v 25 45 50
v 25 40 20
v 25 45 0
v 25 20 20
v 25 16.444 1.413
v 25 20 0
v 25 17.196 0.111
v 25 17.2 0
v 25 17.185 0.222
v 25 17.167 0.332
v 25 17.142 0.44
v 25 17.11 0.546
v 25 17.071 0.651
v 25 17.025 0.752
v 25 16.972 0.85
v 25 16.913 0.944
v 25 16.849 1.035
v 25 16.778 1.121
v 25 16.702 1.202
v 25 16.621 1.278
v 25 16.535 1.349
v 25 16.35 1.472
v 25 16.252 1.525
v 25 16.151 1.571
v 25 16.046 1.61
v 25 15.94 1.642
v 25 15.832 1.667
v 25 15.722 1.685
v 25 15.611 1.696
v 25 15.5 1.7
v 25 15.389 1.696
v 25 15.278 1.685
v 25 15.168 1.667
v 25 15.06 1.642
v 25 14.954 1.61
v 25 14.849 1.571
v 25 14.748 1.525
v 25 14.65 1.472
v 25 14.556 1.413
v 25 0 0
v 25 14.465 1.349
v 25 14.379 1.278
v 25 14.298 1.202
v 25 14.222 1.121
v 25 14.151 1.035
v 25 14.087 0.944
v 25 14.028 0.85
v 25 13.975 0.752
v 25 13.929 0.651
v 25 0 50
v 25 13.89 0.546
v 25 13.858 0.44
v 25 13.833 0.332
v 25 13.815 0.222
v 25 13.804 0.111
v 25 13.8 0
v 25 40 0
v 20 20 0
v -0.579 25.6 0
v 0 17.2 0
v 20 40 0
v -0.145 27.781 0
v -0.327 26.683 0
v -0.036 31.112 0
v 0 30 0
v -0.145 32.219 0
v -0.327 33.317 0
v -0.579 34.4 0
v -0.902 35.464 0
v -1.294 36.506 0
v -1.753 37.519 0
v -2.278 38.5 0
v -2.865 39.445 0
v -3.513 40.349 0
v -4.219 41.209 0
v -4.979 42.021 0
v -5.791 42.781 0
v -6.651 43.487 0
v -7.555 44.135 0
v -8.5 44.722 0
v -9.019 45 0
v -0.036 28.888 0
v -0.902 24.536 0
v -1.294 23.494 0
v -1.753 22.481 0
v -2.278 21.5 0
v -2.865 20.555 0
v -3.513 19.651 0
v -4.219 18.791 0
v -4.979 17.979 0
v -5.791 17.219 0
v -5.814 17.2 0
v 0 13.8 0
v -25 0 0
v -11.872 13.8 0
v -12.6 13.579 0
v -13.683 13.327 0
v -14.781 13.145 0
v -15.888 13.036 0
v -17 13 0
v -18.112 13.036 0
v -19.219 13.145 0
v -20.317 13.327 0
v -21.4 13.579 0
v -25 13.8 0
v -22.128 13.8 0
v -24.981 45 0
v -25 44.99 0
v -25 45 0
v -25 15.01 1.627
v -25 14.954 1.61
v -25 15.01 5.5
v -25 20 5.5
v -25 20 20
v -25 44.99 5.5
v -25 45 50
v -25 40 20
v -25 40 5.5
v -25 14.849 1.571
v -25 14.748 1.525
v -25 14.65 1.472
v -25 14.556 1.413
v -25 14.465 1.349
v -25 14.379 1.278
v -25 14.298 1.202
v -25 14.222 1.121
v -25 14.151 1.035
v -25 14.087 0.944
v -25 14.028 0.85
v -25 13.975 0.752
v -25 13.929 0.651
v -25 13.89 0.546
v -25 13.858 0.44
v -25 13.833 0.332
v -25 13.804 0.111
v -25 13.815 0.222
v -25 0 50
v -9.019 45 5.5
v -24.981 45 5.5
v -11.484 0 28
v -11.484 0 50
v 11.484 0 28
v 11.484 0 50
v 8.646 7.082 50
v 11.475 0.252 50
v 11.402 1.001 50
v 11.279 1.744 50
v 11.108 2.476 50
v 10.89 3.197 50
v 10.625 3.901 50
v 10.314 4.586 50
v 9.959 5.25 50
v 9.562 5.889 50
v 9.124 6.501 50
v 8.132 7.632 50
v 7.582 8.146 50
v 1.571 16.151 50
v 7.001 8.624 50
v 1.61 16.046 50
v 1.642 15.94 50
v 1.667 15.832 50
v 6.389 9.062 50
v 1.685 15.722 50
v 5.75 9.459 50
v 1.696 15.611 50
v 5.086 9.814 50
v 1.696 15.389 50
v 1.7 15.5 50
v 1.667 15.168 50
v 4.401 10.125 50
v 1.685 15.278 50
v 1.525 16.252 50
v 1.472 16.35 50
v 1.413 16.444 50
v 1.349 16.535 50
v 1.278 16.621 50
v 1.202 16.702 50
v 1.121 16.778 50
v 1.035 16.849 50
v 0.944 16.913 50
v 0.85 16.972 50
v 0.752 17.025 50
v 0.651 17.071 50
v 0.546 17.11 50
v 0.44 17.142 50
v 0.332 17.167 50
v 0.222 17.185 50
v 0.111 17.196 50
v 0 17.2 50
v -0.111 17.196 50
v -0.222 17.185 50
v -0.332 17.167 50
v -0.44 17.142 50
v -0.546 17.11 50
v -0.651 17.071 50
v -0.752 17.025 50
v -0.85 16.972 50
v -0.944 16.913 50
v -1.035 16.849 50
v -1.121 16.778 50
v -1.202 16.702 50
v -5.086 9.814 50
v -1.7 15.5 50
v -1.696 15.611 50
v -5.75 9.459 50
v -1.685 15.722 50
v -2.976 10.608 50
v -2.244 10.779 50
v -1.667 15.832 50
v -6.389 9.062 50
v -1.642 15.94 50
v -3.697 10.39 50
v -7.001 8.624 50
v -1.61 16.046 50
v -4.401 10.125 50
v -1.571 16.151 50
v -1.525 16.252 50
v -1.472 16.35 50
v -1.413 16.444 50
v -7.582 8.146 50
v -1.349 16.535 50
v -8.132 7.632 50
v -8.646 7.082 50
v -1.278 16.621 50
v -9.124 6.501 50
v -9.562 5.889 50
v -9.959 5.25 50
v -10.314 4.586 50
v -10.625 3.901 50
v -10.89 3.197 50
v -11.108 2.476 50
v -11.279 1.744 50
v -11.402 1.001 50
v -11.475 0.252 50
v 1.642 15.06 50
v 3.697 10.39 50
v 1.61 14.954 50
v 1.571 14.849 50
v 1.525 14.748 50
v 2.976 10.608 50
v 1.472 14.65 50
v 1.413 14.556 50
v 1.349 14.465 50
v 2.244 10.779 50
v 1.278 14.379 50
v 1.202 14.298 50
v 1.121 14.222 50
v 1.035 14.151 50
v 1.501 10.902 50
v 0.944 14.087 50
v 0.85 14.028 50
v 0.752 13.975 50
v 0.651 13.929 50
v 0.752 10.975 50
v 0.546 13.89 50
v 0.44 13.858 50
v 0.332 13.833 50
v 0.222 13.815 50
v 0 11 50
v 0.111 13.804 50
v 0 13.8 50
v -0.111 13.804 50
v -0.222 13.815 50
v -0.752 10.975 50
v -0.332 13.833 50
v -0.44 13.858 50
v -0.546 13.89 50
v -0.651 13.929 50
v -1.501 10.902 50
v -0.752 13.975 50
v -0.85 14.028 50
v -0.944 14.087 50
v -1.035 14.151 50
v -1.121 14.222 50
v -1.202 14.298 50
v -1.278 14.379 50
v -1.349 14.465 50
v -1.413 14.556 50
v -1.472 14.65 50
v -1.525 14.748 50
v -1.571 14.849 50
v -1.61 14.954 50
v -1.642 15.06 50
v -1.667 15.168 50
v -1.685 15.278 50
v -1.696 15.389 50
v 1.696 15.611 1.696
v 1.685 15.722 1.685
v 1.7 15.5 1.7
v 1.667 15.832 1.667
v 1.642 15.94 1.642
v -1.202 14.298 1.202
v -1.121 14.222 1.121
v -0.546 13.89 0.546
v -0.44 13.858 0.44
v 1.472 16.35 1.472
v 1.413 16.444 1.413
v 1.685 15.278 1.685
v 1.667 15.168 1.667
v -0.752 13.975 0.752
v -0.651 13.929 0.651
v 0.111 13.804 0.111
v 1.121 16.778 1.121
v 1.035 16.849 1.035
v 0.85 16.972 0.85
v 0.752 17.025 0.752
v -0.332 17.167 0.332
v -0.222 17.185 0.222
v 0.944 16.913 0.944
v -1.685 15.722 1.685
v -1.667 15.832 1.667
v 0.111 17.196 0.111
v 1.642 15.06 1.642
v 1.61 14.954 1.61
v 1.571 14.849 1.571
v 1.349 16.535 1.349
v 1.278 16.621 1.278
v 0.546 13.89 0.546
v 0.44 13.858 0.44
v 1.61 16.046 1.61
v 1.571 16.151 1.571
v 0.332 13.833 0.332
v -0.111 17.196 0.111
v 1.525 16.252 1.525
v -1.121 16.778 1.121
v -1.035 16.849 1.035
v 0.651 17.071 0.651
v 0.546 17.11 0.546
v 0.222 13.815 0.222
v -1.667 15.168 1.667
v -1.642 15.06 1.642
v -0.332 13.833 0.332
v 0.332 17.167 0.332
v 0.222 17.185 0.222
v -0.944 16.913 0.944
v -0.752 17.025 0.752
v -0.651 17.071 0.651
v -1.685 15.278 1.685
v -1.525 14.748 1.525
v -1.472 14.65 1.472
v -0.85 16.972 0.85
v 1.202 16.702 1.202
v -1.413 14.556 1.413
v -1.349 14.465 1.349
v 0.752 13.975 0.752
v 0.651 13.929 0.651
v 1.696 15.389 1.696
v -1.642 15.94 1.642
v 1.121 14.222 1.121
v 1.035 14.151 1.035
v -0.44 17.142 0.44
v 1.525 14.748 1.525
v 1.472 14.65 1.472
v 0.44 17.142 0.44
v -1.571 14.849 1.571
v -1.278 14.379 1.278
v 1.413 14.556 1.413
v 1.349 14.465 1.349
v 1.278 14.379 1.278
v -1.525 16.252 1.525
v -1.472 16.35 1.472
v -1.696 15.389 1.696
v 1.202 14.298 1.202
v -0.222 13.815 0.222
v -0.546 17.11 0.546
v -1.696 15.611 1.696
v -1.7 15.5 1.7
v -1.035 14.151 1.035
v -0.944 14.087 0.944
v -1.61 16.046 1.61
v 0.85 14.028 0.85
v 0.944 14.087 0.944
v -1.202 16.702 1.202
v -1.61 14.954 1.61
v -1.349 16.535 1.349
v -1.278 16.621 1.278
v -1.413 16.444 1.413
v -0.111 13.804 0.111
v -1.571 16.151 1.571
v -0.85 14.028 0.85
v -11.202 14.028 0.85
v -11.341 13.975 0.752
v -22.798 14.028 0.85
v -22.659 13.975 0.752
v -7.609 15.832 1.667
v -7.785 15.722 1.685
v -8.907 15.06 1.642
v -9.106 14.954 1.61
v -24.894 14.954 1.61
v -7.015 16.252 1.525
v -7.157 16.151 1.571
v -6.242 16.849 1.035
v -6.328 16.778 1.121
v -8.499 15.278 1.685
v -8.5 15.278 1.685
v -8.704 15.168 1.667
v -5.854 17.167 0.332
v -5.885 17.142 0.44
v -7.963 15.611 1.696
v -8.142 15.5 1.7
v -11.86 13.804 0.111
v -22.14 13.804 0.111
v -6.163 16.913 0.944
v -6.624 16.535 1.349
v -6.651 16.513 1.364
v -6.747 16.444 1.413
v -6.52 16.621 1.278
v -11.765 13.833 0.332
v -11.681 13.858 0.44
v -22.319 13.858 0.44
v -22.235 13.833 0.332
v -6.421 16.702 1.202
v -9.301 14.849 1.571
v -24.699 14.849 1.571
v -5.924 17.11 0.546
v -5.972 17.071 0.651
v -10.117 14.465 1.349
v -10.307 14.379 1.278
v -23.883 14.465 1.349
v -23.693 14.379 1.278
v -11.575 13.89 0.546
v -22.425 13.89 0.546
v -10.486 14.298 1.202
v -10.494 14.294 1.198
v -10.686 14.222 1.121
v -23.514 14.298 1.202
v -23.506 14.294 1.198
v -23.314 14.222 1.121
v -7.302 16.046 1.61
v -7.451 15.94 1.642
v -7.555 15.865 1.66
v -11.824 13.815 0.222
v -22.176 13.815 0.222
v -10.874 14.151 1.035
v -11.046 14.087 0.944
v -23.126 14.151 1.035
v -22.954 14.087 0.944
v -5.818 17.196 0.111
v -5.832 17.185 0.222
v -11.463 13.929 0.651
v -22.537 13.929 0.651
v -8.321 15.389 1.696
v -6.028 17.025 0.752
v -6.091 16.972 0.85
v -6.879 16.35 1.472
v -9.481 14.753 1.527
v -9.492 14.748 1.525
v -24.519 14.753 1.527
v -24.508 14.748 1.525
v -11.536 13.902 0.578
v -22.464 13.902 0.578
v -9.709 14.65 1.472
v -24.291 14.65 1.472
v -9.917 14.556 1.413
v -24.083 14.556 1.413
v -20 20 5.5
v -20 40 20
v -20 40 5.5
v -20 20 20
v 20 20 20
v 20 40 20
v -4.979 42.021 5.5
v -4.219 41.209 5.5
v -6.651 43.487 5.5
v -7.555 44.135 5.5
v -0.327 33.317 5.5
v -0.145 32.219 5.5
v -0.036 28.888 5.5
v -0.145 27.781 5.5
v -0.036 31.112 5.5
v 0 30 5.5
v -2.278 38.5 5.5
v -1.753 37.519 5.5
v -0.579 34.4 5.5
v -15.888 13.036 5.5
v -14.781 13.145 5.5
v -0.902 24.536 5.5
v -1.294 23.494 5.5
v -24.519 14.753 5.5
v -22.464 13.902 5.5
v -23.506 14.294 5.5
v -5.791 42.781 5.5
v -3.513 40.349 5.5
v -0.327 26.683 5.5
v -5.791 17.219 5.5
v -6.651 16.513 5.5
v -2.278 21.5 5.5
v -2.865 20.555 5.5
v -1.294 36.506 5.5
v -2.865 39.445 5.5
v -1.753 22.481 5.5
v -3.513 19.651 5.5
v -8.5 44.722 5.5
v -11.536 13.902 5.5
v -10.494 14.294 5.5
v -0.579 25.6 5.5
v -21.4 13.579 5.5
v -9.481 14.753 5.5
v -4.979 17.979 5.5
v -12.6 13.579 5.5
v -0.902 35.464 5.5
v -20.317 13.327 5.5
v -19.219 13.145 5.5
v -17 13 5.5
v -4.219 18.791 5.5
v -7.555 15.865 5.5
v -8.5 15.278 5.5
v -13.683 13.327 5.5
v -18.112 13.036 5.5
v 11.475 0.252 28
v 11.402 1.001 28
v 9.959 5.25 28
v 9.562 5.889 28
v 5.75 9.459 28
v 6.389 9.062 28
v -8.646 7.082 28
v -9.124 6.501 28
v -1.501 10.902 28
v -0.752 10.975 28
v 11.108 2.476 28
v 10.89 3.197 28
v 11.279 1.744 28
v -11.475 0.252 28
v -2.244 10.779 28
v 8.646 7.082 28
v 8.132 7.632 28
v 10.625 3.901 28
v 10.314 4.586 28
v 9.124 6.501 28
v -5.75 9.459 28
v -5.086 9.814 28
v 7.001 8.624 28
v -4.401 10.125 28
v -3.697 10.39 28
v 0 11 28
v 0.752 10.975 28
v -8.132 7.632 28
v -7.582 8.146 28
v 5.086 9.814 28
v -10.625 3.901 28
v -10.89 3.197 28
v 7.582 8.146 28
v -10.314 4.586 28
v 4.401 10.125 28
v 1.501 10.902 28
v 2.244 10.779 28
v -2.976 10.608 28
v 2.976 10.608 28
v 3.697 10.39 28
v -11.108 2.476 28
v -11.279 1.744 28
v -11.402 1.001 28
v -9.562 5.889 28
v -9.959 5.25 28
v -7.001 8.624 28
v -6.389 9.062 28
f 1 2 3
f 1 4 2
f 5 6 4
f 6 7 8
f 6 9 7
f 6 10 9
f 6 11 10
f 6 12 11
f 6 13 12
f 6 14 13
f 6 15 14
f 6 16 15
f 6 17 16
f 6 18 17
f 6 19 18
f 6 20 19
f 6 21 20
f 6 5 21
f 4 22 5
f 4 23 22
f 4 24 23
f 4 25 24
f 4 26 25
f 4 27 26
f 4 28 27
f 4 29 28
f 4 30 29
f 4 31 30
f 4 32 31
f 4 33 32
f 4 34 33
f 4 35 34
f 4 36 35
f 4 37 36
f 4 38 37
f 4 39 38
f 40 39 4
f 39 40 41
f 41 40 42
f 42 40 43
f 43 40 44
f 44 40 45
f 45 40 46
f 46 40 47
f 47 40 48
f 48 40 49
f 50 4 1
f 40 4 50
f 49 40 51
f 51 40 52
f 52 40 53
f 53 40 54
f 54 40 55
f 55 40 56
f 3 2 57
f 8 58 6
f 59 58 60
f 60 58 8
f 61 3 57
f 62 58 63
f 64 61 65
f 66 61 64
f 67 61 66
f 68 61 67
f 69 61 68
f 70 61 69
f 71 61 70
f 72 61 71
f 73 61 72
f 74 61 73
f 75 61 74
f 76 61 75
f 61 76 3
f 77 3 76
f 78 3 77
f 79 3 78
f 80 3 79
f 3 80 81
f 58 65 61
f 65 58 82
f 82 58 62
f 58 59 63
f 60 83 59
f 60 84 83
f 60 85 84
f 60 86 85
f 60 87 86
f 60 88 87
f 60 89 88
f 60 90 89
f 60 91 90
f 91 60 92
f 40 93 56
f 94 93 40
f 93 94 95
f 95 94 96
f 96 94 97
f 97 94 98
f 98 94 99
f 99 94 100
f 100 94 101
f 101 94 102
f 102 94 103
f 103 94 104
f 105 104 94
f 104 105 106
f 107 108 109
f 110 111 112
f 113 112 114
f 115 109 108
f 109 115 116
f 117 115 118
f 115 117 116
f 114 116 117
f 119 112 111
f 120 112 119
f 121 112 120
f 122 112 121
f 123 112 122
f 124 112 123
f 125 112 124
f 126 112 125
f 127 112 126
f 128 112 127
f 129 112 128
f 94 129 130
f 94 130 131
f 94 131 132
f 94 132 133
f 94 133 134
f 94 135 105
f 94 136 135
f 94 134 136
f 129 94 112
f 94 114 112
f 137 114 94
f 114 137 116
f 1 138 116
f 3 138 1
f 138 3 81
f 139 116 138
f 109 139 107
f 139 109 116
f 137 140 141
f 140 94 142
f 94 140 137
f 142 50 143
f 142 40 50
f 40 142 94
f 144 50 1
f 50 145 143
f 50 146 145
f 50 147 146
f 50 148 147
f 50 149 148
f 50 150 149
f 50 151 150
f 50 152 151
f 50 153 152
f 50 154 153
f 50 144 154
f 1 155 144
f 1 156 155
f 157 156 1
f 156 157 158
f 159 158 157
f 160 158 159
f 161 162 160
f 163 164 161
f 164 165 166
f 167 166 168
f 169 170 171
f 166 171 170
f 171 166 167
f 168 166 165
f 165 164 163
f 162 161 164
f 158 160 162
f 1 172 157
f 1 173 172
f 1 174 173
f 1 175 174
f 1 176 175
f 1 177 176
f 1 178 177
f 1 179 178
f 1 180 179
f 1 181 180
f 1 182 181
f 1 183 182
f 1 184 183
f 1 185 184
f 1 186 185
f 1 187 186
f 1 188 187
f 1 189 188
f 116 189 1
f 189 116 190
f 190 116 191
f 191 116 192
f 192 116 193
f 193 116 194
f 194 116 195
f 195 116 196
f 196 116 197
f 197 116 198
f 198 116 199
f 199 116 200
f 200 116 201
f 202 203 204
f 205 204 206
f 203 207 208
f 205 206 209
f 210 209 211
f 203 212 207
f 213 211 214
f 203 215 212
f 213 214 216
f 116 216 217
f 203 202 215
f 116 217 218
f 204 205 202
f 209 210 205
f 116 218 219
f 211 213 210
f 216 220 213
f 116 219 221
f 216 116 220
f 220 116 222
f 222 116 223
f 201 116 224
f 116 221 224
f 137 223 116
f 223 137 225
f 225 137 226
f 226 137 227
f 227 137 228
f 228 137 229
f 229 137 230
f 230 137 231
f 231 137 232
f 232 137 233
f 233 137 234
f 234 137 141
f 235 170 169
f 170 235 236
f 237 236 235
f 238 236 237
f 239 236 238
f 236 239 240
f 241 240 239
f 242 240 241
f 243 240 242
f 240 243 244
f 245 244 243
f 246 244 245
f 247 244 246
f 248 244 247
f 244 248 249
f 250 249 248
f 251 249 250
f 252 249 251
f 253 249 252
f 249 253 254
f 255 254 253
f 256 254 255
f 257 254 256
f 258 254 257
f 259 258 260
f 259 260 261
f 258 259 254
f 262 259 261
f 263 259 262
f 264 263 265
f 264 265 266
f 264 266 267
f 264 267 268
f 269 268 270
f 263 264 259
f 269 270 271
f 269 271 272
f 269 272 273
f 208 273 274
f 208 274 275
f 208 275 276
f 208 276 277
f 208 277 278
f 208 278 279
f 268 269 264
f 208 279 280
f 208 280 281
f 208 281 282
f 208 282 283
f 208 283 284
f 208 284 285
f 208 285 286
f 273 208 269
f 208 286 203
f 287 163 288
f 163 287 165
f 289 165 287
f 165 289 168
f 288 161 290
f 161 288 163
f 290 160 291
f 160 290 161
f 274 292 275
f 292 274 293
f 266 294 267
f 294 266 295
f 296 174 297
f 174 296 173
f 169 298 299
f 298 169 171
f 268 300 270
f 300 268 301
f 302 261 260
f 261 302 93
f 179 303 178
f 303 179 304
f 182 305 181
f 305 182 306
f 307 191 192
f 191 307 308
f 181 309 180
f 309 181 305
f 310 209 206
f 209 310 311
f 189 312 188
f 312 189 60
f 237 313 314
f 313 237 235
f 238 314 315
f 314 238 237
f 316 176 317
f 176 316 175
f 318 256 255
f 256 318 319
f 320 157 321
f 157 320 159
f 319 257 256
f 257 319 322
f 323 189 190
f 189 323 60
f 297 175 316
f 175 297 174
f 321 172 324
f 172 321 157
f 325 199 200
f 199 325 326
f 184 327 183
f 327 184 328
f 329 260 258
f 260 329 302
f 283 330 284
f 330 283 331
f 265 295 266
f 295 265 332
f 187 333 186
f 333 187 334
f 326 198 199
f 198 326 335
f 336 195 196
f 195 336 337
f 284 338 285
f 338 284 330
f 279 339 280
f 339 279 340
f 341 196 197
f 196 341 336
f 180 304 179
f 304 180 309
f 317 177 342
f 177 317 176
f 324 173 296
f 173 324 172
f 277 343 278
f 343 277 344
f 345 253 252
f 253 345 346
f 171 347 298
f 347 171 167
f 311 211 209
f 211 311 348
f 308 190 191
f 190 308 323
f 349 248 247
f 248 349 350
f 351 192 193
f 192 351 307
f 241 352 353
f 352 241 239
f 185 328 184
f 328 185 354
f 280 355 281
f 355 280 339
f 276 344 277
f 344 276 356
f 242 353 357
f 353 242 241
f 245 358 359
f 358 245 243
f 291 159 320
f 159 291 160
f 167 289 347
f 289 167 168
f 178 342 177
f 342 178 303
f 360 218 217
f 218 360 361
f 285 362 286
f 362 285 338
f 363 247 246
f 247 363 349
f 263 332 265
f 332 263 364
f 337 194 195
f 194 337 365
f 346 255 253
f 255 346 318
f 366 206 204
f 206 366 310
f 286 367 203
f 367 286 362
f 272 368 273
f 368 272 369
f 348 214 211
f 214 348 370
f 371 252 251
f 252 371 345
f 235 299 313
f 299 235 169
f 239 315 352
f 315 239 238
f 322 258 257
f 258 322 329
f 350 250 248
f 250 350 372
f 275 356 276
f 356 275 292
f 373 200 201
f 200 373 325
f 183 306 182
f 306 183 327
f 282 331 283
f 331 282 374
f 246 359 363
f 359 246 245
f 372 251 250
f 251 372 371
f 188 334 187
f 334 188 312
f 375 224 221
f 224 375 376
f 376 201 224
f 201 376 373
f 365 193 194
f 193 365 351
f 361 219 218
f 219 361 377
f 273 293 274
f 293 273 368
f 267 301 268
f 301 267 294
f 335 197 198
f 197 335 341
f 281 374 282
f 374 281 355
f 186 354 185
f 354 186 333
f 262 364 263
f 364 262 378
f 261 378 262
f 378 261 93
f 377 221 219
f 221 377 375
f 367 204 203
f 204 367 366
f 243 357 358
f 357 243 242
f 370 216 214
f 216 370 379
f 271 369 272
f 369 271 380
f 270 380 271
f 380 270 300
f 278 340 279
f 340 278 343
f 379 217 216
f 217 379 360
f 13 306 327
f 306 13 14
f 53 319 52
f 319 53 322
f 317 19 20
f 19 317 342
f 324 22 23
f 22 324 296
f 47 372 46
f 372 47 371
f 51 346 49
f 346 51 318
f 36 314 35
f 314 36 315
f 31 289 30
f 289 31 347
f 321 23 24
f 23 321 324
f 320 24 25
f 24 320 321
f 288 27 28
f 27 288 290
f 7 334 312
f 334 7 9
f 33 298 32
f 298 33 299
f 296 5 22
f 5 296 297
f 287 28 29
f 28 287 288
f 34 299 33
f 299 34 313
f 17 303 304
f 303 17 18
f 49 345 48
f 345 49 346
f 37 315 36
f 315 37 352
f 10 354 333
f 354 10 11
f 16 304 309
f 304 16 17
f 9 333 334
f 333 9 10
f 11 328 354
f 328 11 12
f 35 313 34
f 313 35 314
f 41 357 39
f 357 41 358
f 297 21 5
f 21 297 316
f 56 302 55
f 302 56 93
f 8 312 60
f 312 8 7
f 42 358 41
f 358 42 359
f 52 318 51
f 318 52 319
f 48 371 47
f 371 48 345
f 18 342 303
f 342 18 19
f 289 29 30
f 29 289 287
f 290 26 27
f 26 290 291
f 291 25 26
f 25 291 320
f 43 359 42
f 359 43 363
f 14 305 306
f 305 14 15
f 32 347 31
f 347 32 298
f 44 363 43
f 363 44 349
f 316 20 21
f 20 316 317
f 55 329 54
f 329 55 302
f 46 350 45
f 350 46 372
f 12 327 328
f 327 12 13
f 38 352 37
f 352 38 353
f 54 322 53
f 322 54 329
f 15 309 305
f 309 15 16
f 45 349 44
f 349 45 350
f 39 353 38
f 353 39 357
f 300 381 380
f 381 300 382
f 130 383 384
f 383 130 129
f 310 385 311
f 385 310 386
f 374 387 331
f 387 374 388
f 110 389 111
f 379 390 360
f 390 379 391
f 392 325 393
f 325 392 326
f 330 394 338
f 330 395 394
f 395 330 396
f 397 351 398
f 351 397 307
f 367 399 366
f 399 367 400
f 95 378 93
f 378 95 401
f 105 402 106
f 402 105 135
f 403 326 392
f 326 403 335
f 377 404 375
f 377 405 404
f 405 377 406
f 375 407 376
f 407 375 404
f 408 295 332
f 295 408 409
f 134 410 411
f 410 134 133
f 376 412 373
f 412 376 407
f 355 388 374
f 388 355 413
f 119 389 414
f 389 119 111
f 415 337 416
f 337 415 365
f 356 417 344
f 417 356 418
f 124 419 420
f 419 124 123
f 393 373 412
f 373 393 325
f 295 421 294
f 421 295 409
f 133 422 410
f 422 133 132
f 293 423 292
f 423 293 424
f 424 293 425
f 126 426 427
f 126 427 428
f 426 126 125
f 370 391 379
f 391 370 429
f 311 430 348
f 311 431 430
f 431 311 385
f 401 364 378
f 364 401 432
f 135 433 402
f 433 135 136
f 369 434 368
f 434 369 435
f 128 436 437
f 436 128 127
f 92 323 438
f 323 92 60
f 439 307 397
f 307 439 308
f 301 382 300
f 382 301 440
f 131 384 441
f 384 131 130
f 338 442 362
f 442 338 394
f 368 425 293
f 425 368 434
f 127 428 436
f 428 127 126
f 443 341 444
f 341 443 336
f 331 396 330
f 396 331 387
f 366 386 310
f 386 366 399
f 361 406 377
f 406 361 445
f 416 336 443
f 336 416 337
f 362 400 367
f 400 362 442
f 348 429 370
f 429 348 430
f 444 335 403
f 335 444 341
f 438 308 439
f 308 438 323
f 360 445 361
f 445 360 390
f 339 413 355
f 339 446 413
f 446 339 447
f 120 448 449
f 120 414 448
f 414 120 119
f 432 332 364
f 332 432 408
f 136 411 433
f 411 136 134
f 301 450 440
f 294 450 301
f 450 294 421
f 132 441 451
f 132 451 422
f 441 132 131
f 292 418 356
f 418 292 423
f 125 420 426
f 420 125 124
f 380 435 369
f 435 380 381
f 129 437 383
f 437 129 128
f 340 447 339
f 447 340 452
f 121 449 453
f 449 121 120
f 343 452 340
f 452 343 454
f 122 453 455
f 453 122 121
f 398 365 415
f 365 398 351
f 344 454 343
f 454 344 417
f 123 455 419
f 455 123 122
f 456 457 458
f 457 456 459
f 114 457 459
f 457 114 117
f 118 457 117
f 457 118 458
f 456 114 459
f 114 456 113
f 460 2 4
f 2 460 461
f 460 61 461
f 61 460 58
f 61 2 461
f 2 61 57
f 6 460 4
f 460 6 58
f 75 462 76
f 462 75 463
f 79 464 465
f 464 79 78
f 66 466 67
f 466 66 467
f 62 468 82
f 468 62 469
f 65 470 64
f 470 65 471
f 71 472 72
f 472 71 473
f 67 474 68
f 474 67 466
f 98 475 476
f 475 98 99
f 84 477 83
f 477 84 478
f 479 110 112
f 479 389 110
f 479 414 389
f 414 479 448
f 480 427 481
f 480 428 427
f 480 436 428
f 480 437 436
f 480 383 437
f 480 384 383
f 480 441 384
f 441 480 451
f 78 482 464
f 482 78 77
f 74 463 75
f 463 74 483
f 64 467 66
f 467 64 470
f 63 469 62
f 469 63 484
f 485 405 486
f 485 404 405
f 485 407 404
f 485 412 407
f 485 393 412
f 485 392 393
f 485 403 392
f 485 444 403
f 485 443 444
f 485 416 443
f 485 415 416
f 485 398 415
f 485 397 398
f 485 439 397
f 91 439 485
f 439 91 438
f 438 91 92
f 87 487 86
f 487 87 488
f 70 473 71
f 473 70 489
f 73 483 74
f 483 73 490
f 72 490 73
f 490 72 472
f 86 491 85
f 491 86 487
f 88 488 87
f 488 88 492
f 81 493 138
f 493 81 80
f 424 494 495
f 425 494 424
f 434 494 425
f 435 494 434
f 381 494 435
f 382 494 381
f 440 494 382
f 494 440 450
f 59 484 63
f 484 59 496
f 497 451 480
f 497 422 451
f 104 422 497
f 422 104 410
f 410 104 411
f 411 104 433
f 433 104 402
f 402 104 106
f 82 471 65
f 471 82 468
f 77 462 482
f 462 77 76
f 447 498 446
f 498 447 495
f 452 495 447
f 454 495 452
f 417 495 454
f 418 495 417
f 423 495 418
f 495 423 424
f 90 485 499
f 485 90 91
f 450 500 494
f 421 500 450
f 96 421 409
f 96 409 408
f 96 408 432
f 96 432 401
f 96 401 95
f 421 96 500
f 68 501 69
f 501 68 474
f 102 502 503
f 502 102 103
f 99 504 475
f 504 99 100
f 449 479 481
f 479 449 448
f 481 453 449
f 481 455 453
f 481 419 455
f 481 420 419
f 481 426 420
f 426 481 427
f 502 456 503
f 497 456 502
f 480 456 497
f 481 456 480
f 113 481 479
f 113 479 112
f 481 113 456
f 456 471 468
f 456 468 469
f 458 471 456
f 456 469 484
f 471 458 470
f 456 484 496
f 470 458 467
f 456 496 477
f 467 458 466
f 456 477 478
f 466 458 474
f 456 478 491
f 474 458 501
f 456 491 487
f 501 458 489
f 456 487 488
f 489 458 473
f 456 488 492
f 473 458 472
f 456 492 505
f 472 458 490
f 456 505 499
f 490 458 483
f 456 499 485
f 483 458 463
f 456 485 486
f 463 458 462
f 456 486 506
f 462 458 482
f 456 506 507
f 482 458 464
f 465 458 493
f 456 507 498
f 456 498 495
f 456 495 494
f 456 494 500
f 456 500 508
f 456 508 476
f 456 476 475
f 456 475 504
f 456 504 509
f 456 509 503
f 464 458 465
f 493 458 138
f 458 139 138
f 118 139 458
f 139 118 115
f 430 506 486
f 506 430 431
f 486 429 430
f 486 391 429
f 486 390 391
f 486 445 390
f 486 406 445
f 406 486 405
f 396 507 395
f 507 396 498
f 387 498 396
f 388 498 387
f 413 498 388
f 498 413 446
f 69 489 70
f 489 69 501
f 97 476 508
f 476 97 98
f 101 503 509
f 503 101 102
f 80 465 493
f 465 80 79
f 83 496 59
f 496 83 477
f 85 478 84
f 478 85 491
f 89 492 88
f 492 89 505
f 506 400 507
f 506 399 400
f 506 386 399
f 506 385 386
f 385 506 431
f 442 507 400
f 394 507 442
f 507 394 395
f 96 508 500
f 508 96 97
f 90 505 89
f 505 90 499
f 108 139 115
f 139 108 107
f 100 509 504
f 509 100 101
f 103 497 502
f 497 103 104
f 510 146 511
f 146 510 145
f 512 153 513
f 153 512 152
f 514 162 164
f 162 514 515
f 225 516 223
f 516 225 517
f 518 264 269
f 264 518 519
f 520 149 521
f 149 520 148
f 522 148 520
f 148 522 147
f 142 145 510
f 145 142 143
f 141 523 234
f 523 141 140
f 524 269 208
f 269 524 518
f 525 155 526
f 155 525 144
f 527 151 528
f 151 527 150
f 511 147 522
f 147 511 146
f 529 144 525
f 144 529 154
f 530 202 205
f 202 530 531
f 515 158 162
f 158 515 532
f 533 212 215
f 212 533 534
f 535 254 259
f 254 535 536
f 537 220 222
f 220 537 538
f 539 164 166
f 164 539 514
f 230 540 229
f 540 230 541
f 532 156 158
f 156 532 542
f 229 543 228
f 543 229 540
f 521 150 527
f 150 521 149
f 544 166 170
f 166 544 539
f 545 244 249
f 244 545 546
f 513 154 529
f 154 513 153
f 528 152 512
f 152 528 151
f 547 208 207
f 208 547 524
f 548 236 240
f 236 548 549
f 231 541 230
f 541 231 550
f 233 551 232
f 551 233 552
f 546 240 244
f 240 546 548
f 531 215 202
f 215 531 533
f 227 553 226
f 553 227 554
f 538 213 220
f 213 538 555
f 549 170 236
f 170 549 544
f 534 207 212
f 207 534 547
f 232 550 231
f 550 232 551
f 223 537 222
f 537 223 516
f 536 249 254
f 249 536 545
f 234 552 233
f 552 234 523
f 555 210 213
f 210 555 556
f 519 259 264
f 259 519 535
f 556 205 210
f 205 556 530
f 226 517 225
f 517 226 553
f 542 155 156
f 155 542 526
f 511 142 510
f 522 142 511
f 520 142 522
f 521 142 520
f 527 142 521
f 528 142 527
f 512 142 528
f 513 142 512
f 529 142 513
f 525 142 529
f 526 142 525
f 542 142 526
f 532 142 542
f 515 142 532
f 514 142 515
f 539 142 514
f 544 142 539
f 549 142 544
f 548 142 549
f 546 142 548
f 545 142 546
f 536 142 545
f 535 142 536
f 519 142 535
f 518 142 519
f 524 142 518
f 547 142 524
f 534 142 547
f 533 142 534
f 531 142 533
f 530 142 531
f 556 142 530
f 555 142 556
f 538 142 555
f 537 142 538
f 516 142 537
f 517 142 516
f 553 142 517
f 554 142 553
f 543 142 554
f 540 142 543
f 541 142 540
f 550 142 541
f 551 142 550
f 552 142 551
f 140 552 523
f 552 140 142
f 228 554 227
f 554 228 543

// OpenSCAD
// NEMA 17 stepper motor L-shaped mounting bracket
// Print orientation: base plate on the bed, vertical plate builds upward (+Z)

// ---------------- Parameters ----------------
plate_x      = 50;    // base plate length along X (mm)
plate_y      = 45;    // base plate width along Y (mm)
plate_t      = 5;     // base plate thickness along Z (mm)

hole_m4_x    = 17;    // M4 through-hole X offset from centre (mm)
hole_m4_y    = 30;    // M4 through-hole Y position (mm)

plate_z      = 50;    // vertical motor plate height (mm)
boss_d       = 23;    // motor centring boss hole diameter (mm)
boss_z       = 28;    // motor centring boss hole Z position (mm)

screw_d      = 3.4;   // M3 screw hole diameter (mm)
screw_pitch  = 31;    // M3 screw hole square pattern size (mm)

gusset_t     = 5;     // gusset thickness along X (mm)
gusset_leg   = 20;    // gusset leg length along Y and Z (mm)

eps          = 0.5;   // cutter overshoot past faces (mm)
$fn          = 96;    // curve resolution

// ---------------- Model ----------------
difference() {
    union() {
        // Base plate
        translate([-plate_x/2, 0, 0])
            cube([plate_x, plate_y, plate_t]);

        // Vertical motor plate
        translate([-plate_x/2, 0, 0])
            cube([plate_x, plate_y, plate_z]);
    }

    // Base plate through-holes (M4)
    translate([-hole_m4_x, hole_m4_y, -eps])
        cylinder(d = hole_m4_x * 2, h = plate_t + 2 * eps);

    // Motor centring boss hole (through vertical plate, along Y)
    translate([0, -eps, boss_z])
        cylinder(d = boss_d, h = plate_y + 2 * eps);

    // M3 screw holes on square pattern, centred on boss hole
    for (i = [0 : 3])
        rotate([0, 90 * i, 0])
            translate([0, screw_pitch/2, 0])
                cylinder(d = screw_d, h = plate_z + eps);

    // Gussets, flush with left and right edges
    for (sx = [-1, 1])
        translate([sx > 0 ? plate_x/2 - gusset_t : -plate_x/2, 0, 0])
            translate([0, gusset_leg, 0])
                cube([gusset_t, gusset_leg, gusset_leg]);
}
